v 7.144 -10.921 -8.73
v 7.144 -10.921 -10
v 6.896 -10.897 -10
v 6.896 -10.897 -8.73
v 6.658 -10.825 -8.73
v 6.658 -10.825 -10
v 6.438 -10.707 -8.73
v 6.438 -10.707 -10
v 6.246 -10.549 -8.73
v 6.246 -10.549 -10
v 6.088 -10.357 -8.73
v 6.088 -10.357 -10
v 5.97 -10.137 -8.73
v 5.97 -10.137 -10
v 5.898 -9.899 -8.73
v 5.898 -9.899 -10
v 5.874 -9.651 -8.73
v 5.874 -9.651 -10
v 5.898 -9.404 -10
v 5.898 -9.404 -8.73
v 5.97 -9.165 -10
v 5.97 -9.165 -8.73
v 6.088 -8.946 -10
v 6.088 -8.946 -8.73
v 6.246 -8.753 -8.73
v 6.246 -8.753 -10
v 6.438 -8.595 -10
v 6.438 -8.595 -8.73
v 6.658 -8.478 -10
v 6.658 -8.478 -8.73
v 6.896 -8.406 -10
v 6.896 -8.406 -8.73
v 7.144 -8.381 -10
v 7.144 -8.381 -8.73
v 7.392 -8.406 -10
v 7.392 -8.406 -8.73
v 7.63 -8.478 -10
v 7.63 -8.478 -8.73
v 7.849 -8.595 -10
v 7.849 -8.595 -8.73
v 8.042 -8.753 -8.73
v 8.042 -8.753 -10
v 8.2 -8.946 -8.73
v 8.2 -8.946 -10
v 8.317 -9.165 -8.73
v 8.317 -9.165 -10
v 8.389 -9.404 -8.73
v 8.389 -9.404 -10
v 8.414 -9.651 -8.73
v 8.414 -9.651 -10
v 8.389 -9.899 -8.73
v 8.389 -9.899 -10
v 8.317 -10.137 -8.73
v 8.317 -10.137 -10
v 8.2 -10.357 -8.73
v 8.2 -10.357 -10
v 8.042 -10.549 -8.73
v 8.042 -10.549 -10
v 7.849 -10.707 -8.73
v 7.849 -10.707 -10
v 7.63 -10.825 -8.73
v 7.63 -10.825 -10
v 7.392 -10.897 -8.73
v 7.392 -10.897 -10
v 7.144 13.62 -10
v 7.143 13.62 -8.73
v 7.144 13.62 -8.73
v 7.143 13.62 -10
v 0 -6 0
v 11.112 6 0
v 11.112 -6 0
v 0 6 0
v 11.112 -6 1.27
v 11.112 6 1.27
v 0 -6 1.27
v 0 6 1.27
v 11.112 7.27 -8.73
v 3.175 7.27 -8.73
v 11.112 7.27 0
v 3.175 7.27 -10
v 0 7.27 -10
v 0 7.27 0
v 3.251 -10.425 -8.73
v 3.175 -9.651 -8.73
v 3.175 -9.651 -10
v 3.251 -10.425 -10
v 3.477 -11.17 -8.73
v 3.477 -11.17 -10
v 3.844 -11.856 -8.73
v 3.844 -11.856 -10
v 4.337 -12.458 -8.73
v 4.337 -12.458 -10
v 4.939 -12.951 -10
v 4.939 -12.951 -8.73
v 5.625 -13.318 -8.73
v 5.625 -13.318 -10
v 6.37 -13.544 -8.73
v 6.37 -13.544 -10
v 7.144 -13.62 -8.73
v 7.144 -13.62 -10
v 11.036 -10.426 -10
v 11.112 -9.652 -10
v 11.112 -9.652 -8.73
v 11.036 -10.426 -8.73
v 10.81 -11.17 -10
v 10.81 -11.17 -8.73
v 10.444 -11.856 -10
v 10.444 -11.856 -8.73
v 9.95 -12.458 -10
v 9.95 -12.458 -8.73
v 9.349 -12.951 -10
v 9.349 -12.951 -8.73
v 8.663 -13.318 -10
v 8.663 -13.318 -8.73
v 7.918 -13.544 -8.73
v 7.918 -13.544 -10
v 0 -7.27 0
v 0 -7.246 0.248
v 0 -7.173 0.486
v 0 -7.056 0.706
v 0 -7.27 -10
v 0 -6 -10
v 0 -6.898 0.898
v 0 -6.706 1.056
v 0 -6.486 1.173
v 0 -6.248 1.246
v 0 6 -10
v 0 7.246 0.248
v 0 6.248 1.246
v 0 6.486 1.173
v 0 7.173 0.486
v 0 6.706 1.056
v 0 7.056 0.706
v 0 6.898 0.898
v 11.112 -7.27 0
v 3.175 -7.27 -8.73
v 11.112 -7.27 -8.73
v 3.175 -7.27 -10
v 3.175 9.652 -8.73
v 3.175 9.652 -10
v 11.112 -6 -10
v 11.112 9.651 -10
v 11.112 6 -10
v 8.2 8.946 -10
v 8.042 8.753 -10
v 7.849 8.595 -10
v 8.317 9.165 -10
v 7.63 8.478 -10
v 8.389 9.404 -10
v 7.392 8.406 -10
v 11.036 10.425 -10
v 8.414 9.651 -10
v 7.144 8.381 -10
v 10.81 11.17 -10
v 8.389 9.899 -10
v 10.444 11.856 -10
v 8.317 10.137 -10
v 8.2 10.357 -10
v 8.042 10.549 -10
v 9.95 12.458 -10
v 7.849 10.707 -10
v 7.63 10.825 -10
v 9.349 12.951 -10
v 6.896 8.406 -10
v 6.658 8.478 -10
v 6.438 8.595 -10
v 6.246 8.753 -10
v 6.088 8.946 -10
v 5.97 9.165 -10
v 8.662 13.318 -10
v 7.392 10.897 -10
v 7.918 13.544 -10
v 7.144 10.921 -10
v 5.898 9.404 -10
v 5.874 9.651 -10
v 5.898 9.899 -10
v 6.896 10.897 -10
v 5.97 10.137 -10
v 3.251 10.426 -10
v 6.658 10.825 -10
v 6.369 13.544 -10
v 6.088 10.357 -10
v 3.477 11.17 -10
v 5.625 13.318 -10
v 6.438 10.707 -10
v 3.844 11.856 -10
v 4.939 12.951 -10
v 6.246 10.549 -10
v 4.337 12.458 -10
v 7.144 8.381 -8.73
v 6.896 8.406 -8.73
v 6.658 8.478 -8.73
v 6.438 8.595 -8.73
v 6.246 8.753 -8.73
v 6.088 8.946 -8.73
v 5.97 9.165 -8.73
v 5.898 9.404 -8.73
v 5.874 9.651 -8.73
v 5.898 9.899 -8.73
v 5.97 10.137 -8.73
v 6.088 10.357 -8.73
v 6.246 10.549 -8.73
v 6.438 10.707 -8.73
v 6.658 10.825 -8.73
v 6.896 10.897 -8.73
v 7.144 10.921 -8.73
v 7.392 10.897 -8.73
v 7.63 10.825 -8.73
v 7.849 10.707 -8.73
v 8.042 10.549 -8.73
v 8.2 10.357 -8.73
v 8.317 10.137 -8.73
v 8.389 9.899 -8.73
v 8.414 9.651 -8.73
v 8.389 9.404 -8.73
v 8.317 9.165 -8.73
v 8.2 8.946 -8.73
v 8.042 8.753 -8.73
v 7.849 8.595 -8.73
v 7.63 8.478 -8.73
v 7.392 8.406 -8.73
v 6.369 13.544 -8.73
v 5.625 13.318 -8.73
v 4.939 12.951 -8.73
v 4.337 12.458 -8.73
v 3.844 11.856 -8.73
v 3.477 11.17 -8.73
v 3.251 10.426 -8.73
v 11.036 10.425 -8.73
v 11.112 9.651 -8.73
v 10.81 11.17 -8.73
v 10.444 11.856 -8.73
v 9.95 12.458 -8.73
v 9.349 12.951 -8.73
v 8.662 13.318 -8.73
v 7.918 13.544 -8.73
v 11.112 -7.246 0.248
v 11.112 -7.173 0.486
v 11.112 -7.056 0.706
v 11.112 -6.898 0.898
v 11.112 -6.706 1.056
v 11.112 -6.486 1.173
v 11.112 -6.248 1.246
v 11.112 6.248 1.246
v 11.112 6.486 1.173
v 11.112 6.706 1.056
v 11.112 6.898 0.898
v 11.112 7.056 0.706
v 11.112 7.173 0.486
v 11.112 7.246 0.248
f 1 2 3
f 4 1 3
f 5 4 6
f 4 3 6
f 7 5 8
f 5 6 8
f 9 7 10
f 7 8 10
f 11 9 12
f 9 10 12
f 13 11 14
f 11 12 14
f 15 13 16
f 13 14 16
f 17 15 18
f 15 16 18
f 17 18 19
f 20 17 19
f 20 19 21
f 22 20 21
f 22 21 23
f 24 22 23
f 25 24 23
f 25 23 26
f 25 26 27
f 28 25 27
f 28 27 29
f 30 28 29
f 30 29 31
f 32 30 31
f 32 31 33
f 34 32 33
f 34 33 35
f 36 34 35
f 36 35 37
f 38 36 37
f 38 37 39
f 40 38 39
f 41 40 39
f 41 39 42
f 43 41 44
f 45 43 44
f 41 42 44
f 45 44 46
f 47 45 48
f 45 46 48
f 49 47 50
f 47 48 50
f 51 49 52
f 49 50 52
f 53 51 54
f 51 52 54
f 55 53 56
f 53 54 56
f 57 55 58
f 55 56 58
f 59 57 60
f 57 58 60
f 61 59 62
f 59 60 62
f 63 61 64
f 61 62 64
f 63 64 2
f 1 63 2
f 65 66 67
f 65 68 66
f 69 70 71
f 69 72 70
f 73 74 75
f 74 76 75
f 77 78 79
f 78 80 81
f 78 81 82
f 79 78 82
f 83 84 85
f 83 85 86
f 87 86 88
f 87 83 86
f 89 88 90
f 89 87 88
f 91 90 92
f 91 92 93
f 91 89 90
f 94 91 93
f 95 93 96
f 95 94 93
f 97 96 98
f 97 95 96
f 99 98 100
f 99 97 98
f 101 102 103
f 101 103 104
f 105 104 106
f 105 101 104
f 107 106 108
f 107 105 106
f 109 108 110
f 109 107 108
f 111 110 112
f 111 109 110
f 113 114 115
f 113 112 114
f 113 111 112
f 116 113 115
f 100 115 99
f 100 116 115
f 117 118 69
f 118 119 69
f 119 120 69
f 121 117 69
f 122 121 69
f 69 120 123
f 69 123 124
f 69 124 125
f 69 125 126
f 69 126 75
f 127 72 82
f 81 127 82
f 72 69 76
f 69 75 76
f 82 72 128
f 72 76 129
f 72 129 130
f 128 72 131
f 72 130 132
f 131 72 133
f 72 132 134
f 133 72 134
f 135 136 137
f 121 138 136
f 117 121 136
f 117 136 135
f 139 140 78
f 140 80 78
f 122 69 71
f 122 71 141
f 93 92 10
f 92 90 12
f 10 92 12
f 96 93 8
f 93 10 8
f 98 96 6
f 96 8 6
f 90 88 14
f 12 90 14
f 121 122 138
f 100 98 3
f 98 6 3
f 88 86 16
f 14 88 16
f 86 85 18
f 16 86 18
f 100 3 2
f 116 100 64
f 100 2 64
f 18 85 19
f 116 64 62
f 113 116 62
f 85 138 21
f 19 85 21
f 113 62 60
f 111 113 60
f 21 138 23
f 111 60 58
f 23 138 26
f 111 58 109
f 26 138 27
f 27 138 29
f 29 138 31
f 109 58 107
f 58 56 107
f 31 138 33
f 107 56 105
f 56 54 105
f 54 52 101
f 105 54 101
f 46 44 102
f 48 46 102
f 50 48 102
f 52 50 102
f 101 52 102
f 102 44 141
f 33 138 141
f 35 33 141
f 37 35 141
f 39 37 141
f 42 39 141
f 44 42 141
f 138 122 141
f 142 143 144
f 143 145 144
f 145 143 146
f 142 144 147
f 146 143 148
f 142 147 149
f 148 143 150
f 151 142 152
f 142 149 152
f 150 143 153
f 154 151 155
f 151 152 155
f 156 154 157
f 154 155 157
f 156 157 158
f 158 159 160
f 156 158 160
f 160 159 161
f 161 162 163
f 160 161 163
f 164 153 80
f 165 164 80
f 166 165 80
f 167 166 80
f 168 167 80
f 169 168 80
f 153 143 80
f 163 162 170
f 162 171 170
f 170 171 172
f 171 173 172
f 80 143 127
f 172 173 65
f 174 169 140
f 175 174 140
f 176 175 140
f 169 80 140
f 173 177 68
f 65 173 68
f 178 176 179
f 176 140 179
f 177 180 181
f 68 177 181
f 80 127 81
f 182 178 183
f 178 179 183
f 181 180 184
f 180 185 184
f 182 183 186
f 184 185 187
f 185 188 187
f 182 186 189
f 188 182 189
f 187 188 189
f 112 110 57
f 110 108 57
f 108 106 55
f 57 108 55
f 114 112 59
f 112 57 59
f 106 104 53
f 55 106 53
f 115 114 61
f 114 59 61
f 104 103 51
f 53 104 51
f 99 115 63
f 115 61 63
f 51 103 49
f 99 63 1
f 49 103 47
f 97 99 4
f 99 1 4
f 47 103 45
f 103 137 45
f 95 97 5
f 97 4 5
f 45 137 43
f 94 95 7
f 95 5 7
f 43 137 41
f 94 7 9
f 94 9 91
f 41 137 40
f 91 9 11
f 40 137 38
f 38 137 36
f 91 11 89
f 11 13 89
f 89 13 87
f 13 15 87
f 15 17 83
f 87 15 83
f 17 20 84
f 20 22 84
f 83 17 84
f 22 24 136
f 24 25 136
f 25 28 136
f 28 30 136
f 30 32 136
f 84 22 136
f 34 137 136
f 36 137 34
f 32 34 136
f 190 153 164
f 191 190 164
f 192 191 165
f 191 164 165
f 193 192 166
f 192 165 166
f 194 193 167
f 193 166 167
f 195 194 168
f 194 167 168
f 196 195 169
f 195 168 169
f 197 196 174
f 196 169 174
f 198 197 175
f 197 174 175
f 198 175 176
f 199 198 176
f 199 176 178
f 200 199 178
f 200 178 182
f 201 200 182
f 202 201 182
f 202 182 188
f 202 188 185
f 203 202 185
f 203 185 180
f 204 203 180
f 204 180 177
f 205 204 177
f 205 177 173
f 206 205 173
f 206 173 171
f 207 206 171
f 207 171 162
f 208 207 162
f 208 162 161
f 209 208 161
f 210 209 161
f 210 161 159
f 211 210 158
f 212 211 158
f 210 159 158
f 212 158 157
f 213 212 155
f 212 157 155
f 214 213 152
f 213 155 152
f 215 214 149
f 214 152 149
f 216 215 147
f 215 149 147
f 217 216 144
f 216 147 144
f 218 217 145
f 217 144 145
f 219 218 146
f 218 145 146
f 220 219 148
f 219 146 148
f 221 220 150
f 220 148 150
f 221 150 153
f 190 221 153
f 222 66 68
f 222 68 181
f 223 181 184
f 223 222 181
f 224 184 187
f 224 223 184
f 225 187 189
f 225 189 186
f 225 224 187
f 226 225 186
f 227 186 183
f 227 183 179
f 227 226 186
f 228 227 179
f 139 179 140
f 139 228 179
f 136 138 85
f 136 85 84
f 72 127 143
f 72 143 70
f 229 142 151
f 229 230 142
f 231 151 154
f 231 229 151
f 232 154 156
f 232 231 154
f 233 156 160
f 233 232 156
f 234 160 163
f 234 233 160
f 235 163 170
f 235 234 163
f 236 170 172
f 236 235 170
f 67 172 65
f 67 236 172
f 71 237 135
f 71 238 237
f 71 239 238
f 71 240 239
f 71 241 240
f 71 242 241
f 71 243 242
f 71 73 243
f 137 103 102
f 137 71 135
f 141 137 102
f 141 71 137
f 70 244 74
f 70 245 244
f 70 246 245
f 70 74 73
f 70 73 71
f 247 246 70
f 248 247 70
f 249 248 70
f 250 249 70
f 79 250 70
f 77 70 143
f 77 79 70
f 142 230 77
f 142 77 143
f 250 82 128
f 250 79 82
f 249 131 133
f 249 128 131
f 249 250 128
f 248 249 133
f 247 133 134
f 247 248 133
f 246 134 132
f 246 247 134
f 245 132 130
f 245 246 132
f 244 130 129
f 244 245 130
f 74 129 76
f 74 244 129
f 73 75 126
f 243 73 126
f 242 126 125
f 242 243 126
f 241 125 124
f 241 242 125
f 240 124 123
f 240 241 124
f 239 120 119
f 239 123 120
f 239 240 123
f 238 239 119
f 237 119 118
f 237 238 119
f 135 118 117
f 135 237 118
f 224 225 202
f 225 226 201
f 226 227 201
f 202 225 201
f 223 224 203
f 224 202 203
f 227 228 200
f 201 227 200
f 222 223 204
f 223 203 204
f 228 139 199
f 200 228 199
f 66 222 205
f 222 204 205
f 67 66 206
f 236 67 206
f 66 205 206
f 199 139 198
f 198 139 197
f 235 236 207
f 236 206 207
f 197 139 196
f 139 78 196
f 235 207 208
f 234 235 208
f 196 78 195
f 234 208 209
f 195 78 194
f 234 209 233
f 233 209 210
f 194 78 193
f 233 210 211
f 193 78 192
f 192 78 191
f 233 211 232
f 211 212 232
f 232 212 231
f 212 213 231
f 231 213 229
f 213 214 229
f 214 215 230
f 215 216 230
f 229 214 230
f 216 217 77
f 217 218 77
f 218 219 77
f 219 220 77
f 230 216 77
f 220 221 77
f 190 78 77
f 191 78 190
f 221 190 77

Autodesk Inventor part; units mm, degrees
ref_plane "YZ Plane" through (0, 0, 0) normal (1, 0, 0) x (0, 1, 0)
ref_plane "XZ Plane" through (0, 0, 0) normal (0, 1, 0) x (-1, 0, 0)
ref_plane "XY Plane" through (0, 0, 0) normal (0, 0, 1) x (1, 0, 0)
sketch "Sketch1" plane through (0, 0, 0) normal (1, 0, 0) x (0, 1, 0)
  arc A0 (4.3225, -9.9221) -> (5.9696, -5.6989) centre (-2.06, -5) ccw projected
  arc A1 (5.9244, -3.8989) -> (4.3225, -0.0779) centre (-2.06, -5) ccw projected
  arc A2 (-5.9696, -5.6989) -> (-4.3225, -9.9221) centre (2.06, -5) ccw projected
  arc A3 (-4.3225, -0.0779) -> (-5.9244, -3.8989) centre (2.06, -5) ccw projected
  line L0 (4.1641, 0) -> (-4.1641, 0) projected
  line L1 (-4.1641, -10) -> (4.1641, -10) projected
  line L2 (6, -10) -> (6, 0)
  line L3 (6, 0) -> (-6, 0)
  line L4 (-6, 0) -> (-6, -10)
  line L5 (-6, -10) -> (-7.27, -10)
  line L6 (-7.27, -10) -> (-7.27, 1.27)
  line L7 (6, -10) -> (7.27, -10)
  line L8 (6, 0) -> (6, 1.27) construction
  line L9 (6, 1.27) -> (-7.27, 1.27)
  line L10 (7.27, -10) -> (7.27, 1.27)
  line L11 (7.27, 1.27) -> (6, 1.27)
  point P0 (0, 0)
  dimension "d0" = 1.27
  dimension "d1" = 1.27
  dimension "d2" = 1.27
extrude "Extrusion1" add sketch "Sketch1" along normal blind 11.1125
sketch "Sketch2" plane through (0, 7.27, 1.27) normal (0, 1, 0) x (1, 0, 0)
  line L0 (11.1125, 11.27) -> (11.1125, 0) projected
  line L1 (0, 11.27) -> (11.1125, 11.27) projected
  line L2 (0, 0) -> (0, 11.27) projected
  line L3 (11.1125, 11.27) -> (3.175, 11.27)
  line L4 (0, 11.27) -> (11.1125, 11.27) projected
  line L5 (3.175, 11.27) -> (3.175, 10)
  line L6 (3.175, 10) -> (11.1125, 10)
  point P0 (0, 1.27)
  dimension "d5" = 7.9375
  dimension "d6" = 1.27
extrude "Extrusion2" add sketch "Sketch2" along normal blind 6.35
fillet "Fillet1" radius 3.9688 1 edges at (11.1125, 13.62, -9.365)
fillet "Fillet2" radius 3.9688 1 edges at (3.175, 13.62, -9.365)
sketch "Sketch3" plane through (3.175, 7.27, -8.73) normal (0, 0, 1) x (1, 0, 0)
  arc A0 (7.9375, 2.3812) -> (0, 2.3813) centre (3.9688, 2.3812) ccw projected
  line L0 (0, 0) -> (0, 2.3813) projected
  line L1 (7.9375, 0) -> (0, 0) projected
  line L2 (7.9375, 0) -> (7.9375, 2.3812) projected
  circle A1 centre (3.9688, 2.3812) radius 1.27
  point P0 (-3.175, -7.27)
  dimension "d11" = 2.54
hole "Hole1" at (7.1438, 9.6513, -8.73) direction (0, 0, -1) diameter 2.54 end through all
sketch "Sketch4" plane through (0, -7.27, -10) normal (0, -1, 0) x (1, 0, 0)
  line L0 (0, 0) -> (0, 11.27) projected
  line L1 (0, 0) -> (11.1125, 0) projected
  line L2 (11.1125, 11.27) -> (11.1125, 0) projected
  line L3 (0, 11.27) -> (11.1125, 11.27) projected
  line L4 (0, 0) -> (11.1125, 0) projected
  line L5 (11.1125, 0) -> (3.175, 0)
  line L6 (11.1125, 1.27) -> (3.175, 1.27) projected
  line L7 (3.175, 0) -> (3.175, 1.27)
  line L8 (3.175, 1.27) -> (11.1125, 1.27)
  line L9 (11.1125, 1.27) -> (11.1125, 0) projected
  line L10 (11.1125, 1.27) -> (11.1125, 0)
  point P0 (0, 10)
  dimension "d19" = 7.9375
  dimension "d20" = 1.27
extrude "Extrusion3" add sketch "Sketch4" along normal blind 6.35 contours L7 L6 L2 L1
fillet "Fillet3" radius 3.9688 1 edges at (3.175, -13.62, -9.365)
fillet "Fillet4" radius 3.9688 1 edges at (11.1125, -13.62, -9.365)
sketch "Sketch5" plane through (3.175, -7.27, -8.73) normal (0, 0, 1) x (1, 0, 0)
  arc A0 (0, -2.3813) -> (7.9375, -2.3813) centre (3.9688, -2.3813) ccw projected
  line L0 (7.9375, 0) -> (7.9375, -2.3813) projected
  line L1 (0, 0) -> (7.9375, 0) projected
  line L2 (0, 0) -> (0, -2.3813) projected
  circle A1 centre (3.9688, -2.3813) radius 1.27
  point P0 (-3.175, 7.27)
  dimension "d25" = 2.54
hole "Hole2" at (7.1438, -9.6513, -8.73) direction (0, 0, -1) diameter 2.54 end through all
fillet "Fillet5" radius 1.27 1 edges at (5.5563, -7.27, 1.27)
fillet "Fillet6" radius 1.27 1 edges at (5.5563, 7.27, 1.27)
properties part number "Mount" material "PAEK Plastic"
